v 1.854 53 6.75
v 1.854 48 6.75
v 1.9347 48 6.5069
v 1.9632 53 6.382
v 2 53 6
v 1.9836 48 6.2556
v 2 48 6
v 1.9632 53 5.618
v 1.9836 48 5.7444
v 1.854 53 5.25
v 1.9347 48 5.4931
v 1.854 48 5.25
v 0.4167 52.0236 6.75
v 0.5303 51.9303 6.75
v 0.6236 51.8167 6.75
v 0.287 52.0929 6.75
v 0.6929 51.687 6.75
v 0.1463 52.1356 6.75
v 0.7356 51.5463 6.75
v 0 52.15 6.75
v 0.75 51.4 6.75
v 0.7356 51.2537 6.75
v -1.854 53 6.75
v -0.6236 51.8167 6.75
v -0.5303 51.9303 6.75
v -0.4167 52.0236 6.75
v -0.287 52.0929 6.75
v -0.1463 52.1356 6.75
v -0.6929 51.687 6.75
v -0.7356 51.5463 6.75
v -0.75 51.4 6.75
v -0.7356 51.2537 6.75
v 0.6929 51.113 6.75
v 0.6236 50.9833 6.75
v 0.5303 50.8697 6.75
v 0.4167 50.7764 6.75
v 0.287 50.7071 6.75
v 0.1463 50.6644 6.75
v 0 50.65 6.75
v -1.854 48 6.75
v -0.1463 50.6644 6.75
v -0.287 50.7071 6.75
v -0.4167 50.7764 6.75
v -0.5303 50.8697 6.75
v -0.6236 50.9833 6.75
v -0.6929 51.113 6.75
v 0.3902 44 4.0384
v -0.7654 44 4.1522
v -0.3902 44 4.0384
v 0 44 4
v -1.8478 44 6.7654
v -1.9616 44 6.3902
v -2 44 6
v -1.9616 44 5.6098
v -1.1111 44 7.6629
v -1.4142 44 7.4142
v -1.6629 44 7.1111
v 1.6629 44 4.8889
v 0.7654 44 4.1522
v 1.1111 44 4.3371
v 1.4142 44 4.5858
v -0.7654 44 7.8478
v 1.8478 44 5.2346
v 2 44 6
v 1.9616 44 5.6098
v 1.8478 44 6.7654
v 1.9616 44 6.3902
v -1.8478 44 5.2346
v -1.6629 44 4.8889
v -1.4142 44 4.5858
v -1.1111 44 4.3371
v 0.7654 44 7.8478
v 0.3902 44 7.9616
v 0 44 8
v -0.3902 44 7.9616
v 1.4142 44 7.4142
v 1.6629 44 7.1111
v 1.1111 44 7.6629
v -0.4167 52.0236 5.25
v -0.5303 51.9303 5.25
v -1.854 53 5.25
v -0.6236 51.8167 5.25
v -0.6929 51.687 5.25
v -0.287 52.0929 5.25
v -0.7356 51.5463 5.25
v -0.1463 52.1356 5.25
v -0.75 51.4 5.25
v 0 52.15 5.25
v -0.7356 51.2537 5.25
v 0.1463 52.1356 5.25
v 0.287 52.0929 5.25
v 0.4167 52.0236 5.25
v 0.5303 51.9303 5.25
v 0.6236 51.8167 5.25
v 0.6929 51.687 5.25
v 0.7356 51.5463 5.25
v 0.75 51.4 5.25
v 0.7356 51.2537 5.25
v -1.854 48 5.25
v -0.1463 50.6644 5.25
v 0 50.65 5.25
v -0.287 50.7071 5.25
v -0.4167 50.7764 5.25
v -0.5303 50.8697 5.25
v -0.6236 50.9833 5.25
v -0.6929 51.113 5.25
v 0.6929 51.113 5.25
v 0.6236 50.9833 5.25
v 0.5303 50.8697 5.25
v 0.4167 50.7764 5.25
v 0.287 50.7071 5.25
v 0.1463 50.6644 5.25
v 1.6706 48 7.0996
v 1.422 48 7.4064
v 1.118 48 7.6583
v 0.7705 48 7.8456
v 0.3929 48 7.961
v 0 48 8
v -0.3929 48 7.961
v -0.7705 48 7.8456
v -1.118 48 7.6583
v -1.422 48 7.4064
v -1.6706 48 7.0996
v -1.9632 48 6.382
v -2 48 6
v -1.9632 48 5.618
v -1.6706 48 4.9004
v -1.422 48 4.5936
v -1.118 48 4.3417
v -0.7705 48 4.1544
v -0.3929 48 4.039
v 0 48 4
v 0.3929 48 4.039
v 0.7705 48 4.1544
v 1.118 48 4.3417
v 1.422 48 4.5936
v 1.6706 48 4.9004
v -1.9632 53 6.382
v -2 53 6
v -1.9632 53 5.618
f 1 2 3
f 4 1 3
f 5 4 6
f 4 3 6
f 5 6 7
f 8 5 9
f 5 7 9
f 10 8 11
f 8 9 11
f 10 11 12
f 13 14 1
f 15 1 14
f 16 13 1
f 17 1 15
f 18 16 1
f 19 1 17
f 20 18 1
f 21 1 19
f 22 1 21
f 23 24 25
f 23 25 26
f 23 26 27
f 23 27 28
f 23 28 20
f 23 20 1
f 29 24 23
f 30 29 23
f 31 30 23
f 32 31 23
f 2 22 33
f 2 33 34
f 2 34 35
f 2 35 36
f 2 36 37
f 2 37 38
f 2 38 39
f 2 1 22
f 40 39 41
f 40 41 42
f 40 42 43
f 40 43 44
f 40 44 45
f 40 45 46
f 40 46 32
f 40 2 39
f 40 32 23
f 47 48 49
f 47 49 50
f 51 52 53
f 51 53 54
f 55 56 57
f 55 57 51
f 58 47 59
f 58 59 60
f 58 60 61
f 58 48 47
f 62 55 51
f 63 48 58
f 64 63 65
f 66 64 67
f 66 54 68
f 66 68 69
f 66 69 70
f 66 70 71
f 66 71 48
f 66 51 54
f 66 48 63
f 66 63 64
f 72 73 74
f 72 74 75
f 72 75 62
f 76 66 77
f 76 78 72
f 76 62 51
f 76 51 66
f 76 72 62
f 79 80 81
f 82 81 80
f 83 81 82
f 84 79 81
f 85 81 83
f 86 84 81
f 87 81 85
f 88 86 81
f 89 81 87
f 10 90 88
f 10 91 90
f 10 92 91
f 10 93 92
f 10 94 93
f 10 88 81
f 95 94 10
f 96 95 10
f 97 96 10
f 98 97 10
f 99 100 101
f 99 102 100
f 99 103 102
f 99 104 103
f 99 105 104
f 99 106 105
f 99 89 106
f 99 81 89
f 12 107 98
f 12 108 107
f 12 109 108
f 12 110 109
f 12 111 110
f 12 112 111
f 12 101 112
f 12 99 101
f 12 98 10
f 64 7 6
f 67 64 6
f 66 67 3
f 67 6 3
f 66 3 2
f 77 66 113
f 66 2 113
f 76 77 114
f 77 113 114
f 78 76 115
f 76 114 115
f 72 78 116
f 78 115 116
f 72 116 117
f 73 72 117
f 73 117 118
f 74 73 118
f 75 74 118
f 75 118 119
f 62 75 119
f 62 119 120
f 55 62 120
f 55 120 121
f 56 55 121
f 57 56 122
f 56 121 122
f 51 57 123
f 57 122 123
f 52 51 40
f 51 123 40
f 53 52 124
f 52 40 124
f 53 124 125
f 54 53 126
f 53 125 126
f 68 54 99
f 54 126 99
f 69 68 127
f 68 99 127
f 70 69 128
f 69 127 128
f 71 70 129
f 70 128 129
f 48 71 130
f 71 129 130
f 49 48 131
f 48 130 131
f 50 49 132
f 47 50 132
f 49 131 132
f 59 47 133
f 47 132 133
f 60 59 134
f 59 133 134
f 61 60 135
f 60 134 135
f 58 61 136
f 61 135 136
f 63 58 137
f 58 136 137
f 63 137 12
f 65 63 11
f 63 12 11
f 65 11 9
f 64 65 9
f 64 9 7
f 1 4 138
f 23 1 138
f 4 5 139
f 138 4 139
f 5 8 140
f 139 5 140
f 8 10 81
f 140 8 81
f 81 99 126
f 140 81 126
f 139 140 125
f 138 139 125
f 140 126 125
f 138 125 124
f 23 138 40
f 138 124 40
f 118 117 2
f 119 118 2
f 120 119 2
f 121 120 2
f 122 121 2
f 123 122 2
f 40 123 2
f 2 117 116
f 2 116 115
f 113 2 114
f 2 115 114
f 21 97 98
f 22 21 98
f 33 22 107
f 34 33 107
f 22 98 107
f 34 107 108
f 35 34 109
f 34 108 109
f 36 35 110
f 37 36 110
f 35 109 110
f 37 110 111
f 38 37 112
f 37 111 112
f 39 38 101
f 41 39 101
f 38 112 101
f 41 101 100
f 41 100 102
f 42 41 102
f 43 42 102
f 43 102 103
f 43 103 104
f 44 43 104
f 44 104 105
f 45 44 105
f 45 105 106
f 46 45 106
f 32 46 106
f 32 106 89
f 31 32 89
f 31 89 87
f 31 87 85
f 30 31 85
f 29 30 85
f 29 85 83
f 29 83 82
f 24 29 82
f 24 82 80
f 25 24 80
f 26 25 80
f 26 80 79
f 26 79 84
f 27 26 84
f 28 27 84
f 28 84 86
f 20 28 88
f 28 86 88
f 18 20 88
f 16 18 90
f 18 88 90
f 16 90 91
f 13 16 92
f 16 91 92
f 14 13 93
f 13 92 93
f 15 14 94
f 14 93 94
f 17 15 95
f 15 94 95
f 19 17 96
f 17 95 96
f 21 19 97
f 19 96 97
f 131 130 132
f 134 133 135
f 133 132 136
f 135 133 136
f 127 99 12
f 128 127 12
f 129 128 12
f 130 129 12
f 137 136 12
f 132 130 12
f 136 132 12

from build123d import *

# Parameters (mm, degrees)
SKETCH002_R     = 2
PAD_DEPTH       = 4
PAD001_DEPTH    = 5
SKETCH004_R     = 0.75
POCKET001_DEPTH = 5


with BuildPart() as part:
    # Sketch002 → Pad (new body)
    with BuildSketch(Plane.XZ):
        Circle(SKETCH002_R)
    extrude(amount=PAD_DEPTH)

    # Sketch003 (on Face2 of Pad) → Pad001 (join)
    with BuildSketch(Plane(origin=(0, 0, 0), x_dir=(1, 0, 0), z_dir=(0, 1, 0))):
        with BuildLine():
            Line((-1.85405, 0.75), (1.85405, 0.75))
            ThreePointArc((1.85405, -0.75), (2, 0), (1.85405, 0.75))
            Line((1.85405, -0.75), (-1.85405, -0.75))
            ThreePointArc((-1.85405, 0.75), (-2, 0), (-1.85405, -0.75))
        make_face()
    extrude(amount=PAD001_DEPTH)

    # Sketch004 (on Face2 of Pad001) → Pocket001 (cut)
    with BuildSketch(Plane(origin=(0, 0, -0.75), x_dir=(1, 0, 0), z_dir=(0, 0, -1))):
        with Locations((0, -3.4)):
            Circle(SKETCH004_R)
    extrude(amount=-POCKET001_DEPTH, mode=Mode.SUBTRACT)


with BuildPart() as part_1:
    # Body001 placement: moved
    add(part.part.moved(Location((0, 48, 6))))


solid = part_1.part
